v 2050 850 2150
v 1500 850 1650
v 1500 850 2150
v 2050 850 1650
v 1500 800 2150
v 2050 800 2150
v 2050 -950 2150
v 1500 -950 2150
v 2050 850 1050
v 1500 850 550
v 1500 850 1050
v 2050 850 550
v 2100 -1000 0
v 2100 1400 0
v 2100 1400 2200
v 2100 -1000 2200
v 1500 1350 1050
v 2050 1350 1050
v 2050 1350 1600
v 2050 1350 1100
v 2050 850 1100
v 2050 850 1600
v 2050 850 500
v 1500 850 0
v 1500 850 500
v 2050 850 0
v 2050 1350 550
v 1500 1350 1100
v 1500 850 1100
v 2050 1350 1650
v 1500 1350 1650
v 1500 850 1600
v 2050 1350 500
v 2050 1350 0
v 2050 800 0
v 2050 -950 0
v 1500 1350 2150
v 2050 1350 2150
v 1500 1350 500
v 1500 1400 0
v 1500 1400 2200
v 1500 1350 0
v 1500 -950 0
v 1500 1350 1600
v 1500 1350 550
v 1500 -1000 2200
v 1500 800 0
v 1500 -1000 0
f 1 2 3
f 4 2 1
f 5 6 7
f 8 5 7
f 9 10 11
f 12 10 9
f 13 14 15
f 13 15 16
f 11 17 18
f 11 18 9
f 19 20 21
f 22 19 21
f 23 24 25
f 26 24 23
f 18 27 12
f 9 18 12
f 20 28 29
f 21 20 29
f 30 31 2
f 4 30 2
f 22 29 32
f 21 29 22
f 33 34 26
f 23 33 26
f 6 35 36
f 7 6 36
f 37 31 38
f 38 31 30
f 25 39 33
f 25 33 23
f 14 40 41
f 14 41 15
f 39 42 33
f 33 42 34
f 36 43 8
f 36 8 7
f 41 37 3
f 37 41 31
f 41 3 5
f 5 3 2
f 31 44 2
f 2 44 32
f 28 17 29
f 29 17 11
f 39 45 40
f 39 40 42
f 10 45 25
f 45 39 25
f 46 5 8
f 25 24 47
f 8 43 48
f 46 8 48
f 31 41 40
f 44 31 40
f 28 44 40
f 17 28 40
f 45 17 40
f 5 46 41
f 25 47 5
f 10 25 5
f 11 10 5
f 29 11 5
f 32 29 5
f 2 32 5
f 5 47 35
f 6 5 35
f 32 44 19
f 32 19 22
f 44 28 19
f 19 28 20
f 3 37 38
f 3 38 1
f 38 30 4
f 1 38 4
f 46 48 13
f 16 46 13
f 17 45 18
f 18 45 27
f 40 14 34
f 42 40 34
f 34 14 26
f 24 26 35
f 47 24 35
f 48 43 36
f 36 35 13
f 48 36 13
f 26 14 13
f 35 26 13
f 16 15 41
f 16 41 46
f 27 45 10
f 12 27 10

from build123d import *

# Parameters (mm, degrees)
BOX3569_W        = 1750
BOX3569_H        = 550
BOX3569_DEPTH    = 2150
BOX3519_W        = 500
BOX3519_H        = 550
BOX3519_DEPTH    = 500
ARRAY278_Z_COUNT = 4
ARRAY278_Z_PITCH = 550
BOX3116_W        = 2400
BOX3116_H        = 600
BOX3116_DEPTH    = 2200


with BuildPart() as box3569:
    # Box3569 → Box3569 (new body)
    with BuildSketch(Plane(origin=(1600, 800, 0), x_dir=(0, -1, 0), z_dir=(0, 0, 1))):
        with Locations((875, 275)):
            Rectangle(BOX3569_W, BOX3569_H)
    extrude(amount=BOX3569_DEPTH)


with BuildPart() as array278:
    # Box3519 → Box3519 (new body)
    with BuildSketch(Plane(origin=(1600, 1350, 0), x_dir=(0, -1, 0), z_dir=(0, 0, 1))):
        with Locations((250, 275)):
            Rectangle(BOX3519_W, BOX3519_H)
    extrude(amount=BOX3519_DEPTH)

    # Array278 Z: Array278 ×4


with BuildPart() as array278_1:
    add(array278.part)
    with Locations(*[(0, 0, i * ARRAY278_Z_PITCH) for i in range(1, ARRAY278_Z_COUNT)]):
        add(array278.part)


with BuildPart() as cut005:
    # Box3116 → Box3116 (new body)
    with BuildSketch(Plane(origin=(1600, 1400, 0), x_dir=(0, -1, 0), z_dir=(0, 0, 1))):
        with Locations((1200, 300)):
            Rectangle(BOX3116_W, BOX3116_H)
    extrude(amount=BOX3116_DEPTH)

    # Cut: cut Array278
    add(array278_1.part, mode=Mode.SUBTRACT)

    # Cut005: cut Box3569
    add(box3569.part, mode=Mode.SUBTRACT)


with BuildPart() as cut005_1:
    # Cut005 placement: moved
    add(cut005.part.moved(Location((-100, 0, 0))))


solid = cut005_1.part
